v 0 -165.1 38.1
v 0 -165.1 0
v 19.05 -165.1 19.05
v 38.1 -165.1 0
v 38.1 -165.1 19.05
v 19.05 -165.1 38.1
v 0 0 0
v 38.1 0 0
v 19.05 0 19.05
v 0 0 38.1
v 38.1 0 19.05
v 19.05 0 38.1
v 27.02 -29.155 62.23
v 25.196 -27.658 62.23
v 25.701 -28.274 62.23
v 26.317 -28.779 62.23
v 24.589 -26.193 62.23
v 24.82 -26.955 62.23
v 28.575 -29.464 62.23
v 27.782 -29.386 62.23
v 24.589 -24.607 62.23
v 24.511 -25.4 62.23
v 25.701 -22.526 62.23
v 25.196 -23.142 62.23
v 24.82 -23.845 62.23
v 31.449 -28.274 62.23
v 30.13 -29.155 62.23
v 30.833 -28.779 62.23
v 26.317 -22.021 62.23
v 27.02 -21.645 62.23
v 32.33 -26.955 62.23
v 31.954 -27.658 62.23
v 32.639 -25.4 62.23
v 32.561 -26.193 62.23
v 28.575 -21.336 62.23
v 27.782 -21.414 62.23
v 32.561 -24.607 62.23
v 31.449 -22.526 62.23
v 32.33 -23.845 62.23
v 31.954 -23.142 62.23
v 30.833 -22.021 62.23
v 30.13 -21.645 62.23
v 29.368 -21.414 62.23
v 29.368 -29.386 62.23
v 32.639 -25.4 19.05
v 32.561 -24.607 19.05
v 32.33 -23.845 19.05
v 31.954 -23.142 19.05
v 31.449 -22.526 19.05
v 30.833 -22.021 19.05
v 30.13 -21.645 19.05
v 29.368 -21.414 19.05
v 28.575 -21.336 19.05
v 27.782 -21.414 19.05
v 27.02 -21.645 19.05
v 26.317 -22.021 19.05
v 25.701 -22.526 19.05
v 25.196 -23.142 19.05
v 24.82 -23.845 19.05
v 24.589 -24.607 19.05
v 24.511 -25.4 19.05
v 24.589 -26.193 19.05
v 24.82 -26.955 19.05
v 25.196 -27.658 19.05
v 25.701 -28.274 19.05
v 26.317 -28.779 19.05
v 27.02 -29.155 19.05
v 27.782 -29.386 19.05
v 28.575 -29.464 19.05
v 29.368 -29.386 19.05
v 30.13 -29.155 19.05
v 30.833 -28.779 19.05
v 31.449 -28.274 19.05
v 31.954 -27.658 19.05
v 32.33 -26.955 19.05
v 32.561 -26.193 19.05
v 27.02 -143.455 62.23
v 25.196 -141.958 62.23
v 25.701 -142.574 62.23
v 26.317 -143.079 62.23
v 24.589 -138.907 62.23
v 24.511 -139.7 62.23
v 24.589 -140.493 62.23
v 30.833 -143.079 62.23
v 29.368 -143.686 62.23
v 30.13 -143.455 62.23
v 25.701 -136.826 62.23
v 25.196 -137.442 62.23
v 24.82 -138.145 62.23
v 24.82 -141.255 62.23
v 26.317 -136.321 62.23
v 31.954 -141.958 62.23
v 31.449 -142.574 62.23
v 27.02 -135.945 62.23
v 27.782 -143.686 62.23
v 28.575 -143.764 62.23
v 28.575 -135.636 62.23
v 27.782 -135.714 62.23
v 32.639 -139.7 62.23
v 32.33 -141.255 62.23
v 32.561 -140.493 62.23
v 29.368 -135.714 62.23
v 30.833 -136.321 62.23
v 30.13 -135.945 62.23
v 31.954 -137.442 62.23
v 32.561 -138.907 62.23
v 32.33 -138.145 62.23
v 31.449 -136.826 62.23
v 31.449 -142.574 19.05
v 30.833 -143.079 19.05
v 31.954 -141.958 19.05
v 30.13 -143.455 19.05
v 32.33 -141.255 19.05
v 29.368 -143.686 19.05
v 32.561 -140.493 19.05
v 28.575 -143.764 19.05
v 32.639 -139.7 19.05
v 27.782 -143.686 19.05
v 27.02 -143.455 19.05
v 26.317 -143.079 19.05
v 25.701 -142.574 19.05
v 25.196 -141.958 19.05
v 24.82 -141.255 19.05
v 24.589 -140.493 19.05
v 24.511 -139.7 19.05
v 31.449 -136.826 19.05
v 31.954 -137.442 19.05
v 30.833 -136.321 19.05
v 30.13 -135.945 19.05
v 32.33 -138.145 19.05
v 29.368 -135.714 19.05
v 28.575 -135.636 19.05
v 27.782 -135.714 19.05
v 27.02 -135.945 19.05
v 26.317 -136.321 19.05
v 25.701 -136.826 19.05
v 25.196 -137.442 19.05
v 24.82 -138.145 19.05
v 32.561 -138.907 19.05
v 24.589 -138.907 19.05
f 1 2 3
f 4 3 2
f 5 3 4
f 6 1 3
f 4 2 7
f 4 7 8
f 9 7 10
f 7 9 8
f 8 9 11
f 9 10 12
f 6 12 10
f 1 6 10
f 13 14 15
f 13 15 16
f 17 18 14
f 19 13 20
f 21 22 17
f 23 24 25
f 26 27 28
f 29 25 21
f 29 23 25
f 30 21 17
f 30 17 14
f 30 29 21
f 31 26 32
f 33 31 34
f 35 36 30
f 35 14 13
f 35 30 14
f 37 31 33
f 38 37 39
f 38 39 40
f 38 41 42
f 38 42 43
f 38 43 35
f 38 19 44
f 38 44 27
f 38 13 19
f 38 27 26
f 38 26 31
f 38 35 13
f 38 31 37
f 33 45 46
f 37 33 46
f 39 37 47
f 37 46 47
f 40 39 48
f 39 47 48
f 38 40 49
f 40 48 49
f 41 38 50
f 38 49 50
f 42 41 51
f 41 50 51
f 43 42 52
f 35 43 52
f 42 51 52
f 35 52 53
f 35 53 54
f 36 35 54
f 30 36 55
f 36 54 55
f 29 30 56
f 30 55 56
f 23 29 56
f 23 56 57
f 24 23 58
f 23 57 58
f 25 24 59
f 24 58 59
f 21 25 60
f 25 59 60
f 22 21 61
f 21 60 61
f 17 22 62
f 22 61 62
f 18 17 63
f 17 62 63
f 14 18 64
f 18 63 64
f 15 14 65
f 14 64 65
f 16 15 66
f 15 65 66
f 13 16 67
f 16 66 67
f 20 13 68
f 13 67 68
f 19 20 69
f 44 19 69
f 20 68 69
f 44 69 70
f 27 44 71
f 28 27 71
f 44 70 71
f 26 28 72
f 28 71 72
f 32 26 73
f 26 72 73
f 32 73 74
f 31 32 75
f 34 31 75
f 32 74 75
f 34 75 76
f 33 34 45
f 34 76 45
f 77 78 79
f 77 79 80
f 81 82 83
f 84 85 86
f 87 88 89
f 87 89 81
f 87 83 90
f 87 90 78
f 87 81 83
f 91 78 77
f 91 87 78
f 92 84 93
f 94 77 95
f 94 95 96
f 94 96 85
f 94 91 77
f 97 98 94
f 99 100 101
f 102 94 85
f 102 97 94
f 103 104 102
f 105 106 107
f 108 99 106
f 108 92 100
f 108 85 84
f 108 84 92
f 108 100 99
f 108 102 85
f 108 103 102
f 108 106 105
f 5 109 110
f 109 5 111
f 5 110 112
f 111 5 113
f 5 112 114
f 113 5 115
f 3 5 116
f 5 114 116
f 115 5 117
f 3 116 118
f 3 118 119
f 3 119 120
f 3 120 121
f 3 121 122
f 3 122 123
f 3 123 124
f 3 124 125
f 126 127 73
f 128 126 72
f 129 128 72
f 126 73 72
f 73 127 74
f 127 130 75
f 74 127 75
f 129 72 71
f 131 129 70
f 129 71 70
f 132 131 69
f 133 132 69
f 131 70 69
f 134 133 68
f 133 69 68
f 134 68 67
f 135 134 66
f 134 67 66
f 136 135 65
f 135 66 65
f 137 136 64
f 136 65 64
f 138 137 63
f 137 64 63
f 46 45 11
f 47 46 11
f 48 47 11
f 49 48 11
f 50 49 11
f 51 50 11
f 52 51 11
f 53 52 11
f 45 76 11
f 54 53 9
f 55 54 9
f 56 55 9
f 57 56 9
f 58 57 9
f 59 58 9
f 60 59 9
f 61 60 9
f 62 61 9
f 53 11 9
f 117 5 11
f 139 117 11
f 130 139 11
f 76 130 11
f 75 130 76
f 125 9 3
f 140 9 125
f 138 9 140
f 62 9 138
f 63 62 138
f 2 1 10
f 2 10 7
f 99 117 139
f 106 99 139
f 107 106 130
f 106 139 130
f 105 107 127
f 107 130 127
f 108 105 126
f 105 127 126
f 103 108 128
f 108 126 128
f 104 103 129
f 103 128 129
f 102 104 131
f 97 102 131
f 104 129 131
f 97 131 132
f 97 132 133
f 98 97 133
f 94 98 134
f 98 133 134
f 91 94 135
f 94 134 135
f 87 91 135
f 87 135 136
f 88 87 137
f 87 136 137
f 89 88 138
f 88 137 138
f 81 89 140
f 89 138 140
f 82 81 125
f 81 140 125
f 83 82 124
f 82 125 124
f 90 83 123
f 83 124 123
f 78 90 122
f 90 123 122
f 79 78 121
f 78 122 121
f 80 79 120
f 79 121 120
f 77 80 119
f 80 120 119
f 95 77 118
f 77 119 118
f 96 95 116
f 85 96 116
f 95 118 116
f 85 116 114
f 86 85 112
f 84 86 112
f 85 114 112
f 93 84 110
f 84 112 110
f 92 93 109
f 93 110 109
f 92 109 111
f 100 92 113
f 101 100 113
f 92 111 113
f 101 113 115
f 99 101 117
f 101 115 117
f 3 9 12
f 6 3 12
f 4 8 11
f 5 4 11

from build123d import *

# Parameters (mm, degrees)
F1_DEPTH = 165.1
F2_R     = 4.064
F3_DEPTH = 43.18


with BuildPart() as f1:
    # F0 (on Front) → F1 (new body)
    with BuildSketch(Plane.XZ):
        Polygon((0, 38.1), (0, 0), (38.1, 0), (38.1, 19.05), (19.05, 19.05), (19.05, 38.1), align=None)
    extrude(amount=F1_DEPTH)

    # F2 (on face) → F3 (join)
    with BuildSketch(Plane.XY.offset(19.05)):
        with Locations((28.575, -25.4)):
            Circle(F2_R)
        with Locations((28.575, -139.7)):
            Circle(F2_R)
    extrude(amount=F3_DEPTH)


solid = f1.part
